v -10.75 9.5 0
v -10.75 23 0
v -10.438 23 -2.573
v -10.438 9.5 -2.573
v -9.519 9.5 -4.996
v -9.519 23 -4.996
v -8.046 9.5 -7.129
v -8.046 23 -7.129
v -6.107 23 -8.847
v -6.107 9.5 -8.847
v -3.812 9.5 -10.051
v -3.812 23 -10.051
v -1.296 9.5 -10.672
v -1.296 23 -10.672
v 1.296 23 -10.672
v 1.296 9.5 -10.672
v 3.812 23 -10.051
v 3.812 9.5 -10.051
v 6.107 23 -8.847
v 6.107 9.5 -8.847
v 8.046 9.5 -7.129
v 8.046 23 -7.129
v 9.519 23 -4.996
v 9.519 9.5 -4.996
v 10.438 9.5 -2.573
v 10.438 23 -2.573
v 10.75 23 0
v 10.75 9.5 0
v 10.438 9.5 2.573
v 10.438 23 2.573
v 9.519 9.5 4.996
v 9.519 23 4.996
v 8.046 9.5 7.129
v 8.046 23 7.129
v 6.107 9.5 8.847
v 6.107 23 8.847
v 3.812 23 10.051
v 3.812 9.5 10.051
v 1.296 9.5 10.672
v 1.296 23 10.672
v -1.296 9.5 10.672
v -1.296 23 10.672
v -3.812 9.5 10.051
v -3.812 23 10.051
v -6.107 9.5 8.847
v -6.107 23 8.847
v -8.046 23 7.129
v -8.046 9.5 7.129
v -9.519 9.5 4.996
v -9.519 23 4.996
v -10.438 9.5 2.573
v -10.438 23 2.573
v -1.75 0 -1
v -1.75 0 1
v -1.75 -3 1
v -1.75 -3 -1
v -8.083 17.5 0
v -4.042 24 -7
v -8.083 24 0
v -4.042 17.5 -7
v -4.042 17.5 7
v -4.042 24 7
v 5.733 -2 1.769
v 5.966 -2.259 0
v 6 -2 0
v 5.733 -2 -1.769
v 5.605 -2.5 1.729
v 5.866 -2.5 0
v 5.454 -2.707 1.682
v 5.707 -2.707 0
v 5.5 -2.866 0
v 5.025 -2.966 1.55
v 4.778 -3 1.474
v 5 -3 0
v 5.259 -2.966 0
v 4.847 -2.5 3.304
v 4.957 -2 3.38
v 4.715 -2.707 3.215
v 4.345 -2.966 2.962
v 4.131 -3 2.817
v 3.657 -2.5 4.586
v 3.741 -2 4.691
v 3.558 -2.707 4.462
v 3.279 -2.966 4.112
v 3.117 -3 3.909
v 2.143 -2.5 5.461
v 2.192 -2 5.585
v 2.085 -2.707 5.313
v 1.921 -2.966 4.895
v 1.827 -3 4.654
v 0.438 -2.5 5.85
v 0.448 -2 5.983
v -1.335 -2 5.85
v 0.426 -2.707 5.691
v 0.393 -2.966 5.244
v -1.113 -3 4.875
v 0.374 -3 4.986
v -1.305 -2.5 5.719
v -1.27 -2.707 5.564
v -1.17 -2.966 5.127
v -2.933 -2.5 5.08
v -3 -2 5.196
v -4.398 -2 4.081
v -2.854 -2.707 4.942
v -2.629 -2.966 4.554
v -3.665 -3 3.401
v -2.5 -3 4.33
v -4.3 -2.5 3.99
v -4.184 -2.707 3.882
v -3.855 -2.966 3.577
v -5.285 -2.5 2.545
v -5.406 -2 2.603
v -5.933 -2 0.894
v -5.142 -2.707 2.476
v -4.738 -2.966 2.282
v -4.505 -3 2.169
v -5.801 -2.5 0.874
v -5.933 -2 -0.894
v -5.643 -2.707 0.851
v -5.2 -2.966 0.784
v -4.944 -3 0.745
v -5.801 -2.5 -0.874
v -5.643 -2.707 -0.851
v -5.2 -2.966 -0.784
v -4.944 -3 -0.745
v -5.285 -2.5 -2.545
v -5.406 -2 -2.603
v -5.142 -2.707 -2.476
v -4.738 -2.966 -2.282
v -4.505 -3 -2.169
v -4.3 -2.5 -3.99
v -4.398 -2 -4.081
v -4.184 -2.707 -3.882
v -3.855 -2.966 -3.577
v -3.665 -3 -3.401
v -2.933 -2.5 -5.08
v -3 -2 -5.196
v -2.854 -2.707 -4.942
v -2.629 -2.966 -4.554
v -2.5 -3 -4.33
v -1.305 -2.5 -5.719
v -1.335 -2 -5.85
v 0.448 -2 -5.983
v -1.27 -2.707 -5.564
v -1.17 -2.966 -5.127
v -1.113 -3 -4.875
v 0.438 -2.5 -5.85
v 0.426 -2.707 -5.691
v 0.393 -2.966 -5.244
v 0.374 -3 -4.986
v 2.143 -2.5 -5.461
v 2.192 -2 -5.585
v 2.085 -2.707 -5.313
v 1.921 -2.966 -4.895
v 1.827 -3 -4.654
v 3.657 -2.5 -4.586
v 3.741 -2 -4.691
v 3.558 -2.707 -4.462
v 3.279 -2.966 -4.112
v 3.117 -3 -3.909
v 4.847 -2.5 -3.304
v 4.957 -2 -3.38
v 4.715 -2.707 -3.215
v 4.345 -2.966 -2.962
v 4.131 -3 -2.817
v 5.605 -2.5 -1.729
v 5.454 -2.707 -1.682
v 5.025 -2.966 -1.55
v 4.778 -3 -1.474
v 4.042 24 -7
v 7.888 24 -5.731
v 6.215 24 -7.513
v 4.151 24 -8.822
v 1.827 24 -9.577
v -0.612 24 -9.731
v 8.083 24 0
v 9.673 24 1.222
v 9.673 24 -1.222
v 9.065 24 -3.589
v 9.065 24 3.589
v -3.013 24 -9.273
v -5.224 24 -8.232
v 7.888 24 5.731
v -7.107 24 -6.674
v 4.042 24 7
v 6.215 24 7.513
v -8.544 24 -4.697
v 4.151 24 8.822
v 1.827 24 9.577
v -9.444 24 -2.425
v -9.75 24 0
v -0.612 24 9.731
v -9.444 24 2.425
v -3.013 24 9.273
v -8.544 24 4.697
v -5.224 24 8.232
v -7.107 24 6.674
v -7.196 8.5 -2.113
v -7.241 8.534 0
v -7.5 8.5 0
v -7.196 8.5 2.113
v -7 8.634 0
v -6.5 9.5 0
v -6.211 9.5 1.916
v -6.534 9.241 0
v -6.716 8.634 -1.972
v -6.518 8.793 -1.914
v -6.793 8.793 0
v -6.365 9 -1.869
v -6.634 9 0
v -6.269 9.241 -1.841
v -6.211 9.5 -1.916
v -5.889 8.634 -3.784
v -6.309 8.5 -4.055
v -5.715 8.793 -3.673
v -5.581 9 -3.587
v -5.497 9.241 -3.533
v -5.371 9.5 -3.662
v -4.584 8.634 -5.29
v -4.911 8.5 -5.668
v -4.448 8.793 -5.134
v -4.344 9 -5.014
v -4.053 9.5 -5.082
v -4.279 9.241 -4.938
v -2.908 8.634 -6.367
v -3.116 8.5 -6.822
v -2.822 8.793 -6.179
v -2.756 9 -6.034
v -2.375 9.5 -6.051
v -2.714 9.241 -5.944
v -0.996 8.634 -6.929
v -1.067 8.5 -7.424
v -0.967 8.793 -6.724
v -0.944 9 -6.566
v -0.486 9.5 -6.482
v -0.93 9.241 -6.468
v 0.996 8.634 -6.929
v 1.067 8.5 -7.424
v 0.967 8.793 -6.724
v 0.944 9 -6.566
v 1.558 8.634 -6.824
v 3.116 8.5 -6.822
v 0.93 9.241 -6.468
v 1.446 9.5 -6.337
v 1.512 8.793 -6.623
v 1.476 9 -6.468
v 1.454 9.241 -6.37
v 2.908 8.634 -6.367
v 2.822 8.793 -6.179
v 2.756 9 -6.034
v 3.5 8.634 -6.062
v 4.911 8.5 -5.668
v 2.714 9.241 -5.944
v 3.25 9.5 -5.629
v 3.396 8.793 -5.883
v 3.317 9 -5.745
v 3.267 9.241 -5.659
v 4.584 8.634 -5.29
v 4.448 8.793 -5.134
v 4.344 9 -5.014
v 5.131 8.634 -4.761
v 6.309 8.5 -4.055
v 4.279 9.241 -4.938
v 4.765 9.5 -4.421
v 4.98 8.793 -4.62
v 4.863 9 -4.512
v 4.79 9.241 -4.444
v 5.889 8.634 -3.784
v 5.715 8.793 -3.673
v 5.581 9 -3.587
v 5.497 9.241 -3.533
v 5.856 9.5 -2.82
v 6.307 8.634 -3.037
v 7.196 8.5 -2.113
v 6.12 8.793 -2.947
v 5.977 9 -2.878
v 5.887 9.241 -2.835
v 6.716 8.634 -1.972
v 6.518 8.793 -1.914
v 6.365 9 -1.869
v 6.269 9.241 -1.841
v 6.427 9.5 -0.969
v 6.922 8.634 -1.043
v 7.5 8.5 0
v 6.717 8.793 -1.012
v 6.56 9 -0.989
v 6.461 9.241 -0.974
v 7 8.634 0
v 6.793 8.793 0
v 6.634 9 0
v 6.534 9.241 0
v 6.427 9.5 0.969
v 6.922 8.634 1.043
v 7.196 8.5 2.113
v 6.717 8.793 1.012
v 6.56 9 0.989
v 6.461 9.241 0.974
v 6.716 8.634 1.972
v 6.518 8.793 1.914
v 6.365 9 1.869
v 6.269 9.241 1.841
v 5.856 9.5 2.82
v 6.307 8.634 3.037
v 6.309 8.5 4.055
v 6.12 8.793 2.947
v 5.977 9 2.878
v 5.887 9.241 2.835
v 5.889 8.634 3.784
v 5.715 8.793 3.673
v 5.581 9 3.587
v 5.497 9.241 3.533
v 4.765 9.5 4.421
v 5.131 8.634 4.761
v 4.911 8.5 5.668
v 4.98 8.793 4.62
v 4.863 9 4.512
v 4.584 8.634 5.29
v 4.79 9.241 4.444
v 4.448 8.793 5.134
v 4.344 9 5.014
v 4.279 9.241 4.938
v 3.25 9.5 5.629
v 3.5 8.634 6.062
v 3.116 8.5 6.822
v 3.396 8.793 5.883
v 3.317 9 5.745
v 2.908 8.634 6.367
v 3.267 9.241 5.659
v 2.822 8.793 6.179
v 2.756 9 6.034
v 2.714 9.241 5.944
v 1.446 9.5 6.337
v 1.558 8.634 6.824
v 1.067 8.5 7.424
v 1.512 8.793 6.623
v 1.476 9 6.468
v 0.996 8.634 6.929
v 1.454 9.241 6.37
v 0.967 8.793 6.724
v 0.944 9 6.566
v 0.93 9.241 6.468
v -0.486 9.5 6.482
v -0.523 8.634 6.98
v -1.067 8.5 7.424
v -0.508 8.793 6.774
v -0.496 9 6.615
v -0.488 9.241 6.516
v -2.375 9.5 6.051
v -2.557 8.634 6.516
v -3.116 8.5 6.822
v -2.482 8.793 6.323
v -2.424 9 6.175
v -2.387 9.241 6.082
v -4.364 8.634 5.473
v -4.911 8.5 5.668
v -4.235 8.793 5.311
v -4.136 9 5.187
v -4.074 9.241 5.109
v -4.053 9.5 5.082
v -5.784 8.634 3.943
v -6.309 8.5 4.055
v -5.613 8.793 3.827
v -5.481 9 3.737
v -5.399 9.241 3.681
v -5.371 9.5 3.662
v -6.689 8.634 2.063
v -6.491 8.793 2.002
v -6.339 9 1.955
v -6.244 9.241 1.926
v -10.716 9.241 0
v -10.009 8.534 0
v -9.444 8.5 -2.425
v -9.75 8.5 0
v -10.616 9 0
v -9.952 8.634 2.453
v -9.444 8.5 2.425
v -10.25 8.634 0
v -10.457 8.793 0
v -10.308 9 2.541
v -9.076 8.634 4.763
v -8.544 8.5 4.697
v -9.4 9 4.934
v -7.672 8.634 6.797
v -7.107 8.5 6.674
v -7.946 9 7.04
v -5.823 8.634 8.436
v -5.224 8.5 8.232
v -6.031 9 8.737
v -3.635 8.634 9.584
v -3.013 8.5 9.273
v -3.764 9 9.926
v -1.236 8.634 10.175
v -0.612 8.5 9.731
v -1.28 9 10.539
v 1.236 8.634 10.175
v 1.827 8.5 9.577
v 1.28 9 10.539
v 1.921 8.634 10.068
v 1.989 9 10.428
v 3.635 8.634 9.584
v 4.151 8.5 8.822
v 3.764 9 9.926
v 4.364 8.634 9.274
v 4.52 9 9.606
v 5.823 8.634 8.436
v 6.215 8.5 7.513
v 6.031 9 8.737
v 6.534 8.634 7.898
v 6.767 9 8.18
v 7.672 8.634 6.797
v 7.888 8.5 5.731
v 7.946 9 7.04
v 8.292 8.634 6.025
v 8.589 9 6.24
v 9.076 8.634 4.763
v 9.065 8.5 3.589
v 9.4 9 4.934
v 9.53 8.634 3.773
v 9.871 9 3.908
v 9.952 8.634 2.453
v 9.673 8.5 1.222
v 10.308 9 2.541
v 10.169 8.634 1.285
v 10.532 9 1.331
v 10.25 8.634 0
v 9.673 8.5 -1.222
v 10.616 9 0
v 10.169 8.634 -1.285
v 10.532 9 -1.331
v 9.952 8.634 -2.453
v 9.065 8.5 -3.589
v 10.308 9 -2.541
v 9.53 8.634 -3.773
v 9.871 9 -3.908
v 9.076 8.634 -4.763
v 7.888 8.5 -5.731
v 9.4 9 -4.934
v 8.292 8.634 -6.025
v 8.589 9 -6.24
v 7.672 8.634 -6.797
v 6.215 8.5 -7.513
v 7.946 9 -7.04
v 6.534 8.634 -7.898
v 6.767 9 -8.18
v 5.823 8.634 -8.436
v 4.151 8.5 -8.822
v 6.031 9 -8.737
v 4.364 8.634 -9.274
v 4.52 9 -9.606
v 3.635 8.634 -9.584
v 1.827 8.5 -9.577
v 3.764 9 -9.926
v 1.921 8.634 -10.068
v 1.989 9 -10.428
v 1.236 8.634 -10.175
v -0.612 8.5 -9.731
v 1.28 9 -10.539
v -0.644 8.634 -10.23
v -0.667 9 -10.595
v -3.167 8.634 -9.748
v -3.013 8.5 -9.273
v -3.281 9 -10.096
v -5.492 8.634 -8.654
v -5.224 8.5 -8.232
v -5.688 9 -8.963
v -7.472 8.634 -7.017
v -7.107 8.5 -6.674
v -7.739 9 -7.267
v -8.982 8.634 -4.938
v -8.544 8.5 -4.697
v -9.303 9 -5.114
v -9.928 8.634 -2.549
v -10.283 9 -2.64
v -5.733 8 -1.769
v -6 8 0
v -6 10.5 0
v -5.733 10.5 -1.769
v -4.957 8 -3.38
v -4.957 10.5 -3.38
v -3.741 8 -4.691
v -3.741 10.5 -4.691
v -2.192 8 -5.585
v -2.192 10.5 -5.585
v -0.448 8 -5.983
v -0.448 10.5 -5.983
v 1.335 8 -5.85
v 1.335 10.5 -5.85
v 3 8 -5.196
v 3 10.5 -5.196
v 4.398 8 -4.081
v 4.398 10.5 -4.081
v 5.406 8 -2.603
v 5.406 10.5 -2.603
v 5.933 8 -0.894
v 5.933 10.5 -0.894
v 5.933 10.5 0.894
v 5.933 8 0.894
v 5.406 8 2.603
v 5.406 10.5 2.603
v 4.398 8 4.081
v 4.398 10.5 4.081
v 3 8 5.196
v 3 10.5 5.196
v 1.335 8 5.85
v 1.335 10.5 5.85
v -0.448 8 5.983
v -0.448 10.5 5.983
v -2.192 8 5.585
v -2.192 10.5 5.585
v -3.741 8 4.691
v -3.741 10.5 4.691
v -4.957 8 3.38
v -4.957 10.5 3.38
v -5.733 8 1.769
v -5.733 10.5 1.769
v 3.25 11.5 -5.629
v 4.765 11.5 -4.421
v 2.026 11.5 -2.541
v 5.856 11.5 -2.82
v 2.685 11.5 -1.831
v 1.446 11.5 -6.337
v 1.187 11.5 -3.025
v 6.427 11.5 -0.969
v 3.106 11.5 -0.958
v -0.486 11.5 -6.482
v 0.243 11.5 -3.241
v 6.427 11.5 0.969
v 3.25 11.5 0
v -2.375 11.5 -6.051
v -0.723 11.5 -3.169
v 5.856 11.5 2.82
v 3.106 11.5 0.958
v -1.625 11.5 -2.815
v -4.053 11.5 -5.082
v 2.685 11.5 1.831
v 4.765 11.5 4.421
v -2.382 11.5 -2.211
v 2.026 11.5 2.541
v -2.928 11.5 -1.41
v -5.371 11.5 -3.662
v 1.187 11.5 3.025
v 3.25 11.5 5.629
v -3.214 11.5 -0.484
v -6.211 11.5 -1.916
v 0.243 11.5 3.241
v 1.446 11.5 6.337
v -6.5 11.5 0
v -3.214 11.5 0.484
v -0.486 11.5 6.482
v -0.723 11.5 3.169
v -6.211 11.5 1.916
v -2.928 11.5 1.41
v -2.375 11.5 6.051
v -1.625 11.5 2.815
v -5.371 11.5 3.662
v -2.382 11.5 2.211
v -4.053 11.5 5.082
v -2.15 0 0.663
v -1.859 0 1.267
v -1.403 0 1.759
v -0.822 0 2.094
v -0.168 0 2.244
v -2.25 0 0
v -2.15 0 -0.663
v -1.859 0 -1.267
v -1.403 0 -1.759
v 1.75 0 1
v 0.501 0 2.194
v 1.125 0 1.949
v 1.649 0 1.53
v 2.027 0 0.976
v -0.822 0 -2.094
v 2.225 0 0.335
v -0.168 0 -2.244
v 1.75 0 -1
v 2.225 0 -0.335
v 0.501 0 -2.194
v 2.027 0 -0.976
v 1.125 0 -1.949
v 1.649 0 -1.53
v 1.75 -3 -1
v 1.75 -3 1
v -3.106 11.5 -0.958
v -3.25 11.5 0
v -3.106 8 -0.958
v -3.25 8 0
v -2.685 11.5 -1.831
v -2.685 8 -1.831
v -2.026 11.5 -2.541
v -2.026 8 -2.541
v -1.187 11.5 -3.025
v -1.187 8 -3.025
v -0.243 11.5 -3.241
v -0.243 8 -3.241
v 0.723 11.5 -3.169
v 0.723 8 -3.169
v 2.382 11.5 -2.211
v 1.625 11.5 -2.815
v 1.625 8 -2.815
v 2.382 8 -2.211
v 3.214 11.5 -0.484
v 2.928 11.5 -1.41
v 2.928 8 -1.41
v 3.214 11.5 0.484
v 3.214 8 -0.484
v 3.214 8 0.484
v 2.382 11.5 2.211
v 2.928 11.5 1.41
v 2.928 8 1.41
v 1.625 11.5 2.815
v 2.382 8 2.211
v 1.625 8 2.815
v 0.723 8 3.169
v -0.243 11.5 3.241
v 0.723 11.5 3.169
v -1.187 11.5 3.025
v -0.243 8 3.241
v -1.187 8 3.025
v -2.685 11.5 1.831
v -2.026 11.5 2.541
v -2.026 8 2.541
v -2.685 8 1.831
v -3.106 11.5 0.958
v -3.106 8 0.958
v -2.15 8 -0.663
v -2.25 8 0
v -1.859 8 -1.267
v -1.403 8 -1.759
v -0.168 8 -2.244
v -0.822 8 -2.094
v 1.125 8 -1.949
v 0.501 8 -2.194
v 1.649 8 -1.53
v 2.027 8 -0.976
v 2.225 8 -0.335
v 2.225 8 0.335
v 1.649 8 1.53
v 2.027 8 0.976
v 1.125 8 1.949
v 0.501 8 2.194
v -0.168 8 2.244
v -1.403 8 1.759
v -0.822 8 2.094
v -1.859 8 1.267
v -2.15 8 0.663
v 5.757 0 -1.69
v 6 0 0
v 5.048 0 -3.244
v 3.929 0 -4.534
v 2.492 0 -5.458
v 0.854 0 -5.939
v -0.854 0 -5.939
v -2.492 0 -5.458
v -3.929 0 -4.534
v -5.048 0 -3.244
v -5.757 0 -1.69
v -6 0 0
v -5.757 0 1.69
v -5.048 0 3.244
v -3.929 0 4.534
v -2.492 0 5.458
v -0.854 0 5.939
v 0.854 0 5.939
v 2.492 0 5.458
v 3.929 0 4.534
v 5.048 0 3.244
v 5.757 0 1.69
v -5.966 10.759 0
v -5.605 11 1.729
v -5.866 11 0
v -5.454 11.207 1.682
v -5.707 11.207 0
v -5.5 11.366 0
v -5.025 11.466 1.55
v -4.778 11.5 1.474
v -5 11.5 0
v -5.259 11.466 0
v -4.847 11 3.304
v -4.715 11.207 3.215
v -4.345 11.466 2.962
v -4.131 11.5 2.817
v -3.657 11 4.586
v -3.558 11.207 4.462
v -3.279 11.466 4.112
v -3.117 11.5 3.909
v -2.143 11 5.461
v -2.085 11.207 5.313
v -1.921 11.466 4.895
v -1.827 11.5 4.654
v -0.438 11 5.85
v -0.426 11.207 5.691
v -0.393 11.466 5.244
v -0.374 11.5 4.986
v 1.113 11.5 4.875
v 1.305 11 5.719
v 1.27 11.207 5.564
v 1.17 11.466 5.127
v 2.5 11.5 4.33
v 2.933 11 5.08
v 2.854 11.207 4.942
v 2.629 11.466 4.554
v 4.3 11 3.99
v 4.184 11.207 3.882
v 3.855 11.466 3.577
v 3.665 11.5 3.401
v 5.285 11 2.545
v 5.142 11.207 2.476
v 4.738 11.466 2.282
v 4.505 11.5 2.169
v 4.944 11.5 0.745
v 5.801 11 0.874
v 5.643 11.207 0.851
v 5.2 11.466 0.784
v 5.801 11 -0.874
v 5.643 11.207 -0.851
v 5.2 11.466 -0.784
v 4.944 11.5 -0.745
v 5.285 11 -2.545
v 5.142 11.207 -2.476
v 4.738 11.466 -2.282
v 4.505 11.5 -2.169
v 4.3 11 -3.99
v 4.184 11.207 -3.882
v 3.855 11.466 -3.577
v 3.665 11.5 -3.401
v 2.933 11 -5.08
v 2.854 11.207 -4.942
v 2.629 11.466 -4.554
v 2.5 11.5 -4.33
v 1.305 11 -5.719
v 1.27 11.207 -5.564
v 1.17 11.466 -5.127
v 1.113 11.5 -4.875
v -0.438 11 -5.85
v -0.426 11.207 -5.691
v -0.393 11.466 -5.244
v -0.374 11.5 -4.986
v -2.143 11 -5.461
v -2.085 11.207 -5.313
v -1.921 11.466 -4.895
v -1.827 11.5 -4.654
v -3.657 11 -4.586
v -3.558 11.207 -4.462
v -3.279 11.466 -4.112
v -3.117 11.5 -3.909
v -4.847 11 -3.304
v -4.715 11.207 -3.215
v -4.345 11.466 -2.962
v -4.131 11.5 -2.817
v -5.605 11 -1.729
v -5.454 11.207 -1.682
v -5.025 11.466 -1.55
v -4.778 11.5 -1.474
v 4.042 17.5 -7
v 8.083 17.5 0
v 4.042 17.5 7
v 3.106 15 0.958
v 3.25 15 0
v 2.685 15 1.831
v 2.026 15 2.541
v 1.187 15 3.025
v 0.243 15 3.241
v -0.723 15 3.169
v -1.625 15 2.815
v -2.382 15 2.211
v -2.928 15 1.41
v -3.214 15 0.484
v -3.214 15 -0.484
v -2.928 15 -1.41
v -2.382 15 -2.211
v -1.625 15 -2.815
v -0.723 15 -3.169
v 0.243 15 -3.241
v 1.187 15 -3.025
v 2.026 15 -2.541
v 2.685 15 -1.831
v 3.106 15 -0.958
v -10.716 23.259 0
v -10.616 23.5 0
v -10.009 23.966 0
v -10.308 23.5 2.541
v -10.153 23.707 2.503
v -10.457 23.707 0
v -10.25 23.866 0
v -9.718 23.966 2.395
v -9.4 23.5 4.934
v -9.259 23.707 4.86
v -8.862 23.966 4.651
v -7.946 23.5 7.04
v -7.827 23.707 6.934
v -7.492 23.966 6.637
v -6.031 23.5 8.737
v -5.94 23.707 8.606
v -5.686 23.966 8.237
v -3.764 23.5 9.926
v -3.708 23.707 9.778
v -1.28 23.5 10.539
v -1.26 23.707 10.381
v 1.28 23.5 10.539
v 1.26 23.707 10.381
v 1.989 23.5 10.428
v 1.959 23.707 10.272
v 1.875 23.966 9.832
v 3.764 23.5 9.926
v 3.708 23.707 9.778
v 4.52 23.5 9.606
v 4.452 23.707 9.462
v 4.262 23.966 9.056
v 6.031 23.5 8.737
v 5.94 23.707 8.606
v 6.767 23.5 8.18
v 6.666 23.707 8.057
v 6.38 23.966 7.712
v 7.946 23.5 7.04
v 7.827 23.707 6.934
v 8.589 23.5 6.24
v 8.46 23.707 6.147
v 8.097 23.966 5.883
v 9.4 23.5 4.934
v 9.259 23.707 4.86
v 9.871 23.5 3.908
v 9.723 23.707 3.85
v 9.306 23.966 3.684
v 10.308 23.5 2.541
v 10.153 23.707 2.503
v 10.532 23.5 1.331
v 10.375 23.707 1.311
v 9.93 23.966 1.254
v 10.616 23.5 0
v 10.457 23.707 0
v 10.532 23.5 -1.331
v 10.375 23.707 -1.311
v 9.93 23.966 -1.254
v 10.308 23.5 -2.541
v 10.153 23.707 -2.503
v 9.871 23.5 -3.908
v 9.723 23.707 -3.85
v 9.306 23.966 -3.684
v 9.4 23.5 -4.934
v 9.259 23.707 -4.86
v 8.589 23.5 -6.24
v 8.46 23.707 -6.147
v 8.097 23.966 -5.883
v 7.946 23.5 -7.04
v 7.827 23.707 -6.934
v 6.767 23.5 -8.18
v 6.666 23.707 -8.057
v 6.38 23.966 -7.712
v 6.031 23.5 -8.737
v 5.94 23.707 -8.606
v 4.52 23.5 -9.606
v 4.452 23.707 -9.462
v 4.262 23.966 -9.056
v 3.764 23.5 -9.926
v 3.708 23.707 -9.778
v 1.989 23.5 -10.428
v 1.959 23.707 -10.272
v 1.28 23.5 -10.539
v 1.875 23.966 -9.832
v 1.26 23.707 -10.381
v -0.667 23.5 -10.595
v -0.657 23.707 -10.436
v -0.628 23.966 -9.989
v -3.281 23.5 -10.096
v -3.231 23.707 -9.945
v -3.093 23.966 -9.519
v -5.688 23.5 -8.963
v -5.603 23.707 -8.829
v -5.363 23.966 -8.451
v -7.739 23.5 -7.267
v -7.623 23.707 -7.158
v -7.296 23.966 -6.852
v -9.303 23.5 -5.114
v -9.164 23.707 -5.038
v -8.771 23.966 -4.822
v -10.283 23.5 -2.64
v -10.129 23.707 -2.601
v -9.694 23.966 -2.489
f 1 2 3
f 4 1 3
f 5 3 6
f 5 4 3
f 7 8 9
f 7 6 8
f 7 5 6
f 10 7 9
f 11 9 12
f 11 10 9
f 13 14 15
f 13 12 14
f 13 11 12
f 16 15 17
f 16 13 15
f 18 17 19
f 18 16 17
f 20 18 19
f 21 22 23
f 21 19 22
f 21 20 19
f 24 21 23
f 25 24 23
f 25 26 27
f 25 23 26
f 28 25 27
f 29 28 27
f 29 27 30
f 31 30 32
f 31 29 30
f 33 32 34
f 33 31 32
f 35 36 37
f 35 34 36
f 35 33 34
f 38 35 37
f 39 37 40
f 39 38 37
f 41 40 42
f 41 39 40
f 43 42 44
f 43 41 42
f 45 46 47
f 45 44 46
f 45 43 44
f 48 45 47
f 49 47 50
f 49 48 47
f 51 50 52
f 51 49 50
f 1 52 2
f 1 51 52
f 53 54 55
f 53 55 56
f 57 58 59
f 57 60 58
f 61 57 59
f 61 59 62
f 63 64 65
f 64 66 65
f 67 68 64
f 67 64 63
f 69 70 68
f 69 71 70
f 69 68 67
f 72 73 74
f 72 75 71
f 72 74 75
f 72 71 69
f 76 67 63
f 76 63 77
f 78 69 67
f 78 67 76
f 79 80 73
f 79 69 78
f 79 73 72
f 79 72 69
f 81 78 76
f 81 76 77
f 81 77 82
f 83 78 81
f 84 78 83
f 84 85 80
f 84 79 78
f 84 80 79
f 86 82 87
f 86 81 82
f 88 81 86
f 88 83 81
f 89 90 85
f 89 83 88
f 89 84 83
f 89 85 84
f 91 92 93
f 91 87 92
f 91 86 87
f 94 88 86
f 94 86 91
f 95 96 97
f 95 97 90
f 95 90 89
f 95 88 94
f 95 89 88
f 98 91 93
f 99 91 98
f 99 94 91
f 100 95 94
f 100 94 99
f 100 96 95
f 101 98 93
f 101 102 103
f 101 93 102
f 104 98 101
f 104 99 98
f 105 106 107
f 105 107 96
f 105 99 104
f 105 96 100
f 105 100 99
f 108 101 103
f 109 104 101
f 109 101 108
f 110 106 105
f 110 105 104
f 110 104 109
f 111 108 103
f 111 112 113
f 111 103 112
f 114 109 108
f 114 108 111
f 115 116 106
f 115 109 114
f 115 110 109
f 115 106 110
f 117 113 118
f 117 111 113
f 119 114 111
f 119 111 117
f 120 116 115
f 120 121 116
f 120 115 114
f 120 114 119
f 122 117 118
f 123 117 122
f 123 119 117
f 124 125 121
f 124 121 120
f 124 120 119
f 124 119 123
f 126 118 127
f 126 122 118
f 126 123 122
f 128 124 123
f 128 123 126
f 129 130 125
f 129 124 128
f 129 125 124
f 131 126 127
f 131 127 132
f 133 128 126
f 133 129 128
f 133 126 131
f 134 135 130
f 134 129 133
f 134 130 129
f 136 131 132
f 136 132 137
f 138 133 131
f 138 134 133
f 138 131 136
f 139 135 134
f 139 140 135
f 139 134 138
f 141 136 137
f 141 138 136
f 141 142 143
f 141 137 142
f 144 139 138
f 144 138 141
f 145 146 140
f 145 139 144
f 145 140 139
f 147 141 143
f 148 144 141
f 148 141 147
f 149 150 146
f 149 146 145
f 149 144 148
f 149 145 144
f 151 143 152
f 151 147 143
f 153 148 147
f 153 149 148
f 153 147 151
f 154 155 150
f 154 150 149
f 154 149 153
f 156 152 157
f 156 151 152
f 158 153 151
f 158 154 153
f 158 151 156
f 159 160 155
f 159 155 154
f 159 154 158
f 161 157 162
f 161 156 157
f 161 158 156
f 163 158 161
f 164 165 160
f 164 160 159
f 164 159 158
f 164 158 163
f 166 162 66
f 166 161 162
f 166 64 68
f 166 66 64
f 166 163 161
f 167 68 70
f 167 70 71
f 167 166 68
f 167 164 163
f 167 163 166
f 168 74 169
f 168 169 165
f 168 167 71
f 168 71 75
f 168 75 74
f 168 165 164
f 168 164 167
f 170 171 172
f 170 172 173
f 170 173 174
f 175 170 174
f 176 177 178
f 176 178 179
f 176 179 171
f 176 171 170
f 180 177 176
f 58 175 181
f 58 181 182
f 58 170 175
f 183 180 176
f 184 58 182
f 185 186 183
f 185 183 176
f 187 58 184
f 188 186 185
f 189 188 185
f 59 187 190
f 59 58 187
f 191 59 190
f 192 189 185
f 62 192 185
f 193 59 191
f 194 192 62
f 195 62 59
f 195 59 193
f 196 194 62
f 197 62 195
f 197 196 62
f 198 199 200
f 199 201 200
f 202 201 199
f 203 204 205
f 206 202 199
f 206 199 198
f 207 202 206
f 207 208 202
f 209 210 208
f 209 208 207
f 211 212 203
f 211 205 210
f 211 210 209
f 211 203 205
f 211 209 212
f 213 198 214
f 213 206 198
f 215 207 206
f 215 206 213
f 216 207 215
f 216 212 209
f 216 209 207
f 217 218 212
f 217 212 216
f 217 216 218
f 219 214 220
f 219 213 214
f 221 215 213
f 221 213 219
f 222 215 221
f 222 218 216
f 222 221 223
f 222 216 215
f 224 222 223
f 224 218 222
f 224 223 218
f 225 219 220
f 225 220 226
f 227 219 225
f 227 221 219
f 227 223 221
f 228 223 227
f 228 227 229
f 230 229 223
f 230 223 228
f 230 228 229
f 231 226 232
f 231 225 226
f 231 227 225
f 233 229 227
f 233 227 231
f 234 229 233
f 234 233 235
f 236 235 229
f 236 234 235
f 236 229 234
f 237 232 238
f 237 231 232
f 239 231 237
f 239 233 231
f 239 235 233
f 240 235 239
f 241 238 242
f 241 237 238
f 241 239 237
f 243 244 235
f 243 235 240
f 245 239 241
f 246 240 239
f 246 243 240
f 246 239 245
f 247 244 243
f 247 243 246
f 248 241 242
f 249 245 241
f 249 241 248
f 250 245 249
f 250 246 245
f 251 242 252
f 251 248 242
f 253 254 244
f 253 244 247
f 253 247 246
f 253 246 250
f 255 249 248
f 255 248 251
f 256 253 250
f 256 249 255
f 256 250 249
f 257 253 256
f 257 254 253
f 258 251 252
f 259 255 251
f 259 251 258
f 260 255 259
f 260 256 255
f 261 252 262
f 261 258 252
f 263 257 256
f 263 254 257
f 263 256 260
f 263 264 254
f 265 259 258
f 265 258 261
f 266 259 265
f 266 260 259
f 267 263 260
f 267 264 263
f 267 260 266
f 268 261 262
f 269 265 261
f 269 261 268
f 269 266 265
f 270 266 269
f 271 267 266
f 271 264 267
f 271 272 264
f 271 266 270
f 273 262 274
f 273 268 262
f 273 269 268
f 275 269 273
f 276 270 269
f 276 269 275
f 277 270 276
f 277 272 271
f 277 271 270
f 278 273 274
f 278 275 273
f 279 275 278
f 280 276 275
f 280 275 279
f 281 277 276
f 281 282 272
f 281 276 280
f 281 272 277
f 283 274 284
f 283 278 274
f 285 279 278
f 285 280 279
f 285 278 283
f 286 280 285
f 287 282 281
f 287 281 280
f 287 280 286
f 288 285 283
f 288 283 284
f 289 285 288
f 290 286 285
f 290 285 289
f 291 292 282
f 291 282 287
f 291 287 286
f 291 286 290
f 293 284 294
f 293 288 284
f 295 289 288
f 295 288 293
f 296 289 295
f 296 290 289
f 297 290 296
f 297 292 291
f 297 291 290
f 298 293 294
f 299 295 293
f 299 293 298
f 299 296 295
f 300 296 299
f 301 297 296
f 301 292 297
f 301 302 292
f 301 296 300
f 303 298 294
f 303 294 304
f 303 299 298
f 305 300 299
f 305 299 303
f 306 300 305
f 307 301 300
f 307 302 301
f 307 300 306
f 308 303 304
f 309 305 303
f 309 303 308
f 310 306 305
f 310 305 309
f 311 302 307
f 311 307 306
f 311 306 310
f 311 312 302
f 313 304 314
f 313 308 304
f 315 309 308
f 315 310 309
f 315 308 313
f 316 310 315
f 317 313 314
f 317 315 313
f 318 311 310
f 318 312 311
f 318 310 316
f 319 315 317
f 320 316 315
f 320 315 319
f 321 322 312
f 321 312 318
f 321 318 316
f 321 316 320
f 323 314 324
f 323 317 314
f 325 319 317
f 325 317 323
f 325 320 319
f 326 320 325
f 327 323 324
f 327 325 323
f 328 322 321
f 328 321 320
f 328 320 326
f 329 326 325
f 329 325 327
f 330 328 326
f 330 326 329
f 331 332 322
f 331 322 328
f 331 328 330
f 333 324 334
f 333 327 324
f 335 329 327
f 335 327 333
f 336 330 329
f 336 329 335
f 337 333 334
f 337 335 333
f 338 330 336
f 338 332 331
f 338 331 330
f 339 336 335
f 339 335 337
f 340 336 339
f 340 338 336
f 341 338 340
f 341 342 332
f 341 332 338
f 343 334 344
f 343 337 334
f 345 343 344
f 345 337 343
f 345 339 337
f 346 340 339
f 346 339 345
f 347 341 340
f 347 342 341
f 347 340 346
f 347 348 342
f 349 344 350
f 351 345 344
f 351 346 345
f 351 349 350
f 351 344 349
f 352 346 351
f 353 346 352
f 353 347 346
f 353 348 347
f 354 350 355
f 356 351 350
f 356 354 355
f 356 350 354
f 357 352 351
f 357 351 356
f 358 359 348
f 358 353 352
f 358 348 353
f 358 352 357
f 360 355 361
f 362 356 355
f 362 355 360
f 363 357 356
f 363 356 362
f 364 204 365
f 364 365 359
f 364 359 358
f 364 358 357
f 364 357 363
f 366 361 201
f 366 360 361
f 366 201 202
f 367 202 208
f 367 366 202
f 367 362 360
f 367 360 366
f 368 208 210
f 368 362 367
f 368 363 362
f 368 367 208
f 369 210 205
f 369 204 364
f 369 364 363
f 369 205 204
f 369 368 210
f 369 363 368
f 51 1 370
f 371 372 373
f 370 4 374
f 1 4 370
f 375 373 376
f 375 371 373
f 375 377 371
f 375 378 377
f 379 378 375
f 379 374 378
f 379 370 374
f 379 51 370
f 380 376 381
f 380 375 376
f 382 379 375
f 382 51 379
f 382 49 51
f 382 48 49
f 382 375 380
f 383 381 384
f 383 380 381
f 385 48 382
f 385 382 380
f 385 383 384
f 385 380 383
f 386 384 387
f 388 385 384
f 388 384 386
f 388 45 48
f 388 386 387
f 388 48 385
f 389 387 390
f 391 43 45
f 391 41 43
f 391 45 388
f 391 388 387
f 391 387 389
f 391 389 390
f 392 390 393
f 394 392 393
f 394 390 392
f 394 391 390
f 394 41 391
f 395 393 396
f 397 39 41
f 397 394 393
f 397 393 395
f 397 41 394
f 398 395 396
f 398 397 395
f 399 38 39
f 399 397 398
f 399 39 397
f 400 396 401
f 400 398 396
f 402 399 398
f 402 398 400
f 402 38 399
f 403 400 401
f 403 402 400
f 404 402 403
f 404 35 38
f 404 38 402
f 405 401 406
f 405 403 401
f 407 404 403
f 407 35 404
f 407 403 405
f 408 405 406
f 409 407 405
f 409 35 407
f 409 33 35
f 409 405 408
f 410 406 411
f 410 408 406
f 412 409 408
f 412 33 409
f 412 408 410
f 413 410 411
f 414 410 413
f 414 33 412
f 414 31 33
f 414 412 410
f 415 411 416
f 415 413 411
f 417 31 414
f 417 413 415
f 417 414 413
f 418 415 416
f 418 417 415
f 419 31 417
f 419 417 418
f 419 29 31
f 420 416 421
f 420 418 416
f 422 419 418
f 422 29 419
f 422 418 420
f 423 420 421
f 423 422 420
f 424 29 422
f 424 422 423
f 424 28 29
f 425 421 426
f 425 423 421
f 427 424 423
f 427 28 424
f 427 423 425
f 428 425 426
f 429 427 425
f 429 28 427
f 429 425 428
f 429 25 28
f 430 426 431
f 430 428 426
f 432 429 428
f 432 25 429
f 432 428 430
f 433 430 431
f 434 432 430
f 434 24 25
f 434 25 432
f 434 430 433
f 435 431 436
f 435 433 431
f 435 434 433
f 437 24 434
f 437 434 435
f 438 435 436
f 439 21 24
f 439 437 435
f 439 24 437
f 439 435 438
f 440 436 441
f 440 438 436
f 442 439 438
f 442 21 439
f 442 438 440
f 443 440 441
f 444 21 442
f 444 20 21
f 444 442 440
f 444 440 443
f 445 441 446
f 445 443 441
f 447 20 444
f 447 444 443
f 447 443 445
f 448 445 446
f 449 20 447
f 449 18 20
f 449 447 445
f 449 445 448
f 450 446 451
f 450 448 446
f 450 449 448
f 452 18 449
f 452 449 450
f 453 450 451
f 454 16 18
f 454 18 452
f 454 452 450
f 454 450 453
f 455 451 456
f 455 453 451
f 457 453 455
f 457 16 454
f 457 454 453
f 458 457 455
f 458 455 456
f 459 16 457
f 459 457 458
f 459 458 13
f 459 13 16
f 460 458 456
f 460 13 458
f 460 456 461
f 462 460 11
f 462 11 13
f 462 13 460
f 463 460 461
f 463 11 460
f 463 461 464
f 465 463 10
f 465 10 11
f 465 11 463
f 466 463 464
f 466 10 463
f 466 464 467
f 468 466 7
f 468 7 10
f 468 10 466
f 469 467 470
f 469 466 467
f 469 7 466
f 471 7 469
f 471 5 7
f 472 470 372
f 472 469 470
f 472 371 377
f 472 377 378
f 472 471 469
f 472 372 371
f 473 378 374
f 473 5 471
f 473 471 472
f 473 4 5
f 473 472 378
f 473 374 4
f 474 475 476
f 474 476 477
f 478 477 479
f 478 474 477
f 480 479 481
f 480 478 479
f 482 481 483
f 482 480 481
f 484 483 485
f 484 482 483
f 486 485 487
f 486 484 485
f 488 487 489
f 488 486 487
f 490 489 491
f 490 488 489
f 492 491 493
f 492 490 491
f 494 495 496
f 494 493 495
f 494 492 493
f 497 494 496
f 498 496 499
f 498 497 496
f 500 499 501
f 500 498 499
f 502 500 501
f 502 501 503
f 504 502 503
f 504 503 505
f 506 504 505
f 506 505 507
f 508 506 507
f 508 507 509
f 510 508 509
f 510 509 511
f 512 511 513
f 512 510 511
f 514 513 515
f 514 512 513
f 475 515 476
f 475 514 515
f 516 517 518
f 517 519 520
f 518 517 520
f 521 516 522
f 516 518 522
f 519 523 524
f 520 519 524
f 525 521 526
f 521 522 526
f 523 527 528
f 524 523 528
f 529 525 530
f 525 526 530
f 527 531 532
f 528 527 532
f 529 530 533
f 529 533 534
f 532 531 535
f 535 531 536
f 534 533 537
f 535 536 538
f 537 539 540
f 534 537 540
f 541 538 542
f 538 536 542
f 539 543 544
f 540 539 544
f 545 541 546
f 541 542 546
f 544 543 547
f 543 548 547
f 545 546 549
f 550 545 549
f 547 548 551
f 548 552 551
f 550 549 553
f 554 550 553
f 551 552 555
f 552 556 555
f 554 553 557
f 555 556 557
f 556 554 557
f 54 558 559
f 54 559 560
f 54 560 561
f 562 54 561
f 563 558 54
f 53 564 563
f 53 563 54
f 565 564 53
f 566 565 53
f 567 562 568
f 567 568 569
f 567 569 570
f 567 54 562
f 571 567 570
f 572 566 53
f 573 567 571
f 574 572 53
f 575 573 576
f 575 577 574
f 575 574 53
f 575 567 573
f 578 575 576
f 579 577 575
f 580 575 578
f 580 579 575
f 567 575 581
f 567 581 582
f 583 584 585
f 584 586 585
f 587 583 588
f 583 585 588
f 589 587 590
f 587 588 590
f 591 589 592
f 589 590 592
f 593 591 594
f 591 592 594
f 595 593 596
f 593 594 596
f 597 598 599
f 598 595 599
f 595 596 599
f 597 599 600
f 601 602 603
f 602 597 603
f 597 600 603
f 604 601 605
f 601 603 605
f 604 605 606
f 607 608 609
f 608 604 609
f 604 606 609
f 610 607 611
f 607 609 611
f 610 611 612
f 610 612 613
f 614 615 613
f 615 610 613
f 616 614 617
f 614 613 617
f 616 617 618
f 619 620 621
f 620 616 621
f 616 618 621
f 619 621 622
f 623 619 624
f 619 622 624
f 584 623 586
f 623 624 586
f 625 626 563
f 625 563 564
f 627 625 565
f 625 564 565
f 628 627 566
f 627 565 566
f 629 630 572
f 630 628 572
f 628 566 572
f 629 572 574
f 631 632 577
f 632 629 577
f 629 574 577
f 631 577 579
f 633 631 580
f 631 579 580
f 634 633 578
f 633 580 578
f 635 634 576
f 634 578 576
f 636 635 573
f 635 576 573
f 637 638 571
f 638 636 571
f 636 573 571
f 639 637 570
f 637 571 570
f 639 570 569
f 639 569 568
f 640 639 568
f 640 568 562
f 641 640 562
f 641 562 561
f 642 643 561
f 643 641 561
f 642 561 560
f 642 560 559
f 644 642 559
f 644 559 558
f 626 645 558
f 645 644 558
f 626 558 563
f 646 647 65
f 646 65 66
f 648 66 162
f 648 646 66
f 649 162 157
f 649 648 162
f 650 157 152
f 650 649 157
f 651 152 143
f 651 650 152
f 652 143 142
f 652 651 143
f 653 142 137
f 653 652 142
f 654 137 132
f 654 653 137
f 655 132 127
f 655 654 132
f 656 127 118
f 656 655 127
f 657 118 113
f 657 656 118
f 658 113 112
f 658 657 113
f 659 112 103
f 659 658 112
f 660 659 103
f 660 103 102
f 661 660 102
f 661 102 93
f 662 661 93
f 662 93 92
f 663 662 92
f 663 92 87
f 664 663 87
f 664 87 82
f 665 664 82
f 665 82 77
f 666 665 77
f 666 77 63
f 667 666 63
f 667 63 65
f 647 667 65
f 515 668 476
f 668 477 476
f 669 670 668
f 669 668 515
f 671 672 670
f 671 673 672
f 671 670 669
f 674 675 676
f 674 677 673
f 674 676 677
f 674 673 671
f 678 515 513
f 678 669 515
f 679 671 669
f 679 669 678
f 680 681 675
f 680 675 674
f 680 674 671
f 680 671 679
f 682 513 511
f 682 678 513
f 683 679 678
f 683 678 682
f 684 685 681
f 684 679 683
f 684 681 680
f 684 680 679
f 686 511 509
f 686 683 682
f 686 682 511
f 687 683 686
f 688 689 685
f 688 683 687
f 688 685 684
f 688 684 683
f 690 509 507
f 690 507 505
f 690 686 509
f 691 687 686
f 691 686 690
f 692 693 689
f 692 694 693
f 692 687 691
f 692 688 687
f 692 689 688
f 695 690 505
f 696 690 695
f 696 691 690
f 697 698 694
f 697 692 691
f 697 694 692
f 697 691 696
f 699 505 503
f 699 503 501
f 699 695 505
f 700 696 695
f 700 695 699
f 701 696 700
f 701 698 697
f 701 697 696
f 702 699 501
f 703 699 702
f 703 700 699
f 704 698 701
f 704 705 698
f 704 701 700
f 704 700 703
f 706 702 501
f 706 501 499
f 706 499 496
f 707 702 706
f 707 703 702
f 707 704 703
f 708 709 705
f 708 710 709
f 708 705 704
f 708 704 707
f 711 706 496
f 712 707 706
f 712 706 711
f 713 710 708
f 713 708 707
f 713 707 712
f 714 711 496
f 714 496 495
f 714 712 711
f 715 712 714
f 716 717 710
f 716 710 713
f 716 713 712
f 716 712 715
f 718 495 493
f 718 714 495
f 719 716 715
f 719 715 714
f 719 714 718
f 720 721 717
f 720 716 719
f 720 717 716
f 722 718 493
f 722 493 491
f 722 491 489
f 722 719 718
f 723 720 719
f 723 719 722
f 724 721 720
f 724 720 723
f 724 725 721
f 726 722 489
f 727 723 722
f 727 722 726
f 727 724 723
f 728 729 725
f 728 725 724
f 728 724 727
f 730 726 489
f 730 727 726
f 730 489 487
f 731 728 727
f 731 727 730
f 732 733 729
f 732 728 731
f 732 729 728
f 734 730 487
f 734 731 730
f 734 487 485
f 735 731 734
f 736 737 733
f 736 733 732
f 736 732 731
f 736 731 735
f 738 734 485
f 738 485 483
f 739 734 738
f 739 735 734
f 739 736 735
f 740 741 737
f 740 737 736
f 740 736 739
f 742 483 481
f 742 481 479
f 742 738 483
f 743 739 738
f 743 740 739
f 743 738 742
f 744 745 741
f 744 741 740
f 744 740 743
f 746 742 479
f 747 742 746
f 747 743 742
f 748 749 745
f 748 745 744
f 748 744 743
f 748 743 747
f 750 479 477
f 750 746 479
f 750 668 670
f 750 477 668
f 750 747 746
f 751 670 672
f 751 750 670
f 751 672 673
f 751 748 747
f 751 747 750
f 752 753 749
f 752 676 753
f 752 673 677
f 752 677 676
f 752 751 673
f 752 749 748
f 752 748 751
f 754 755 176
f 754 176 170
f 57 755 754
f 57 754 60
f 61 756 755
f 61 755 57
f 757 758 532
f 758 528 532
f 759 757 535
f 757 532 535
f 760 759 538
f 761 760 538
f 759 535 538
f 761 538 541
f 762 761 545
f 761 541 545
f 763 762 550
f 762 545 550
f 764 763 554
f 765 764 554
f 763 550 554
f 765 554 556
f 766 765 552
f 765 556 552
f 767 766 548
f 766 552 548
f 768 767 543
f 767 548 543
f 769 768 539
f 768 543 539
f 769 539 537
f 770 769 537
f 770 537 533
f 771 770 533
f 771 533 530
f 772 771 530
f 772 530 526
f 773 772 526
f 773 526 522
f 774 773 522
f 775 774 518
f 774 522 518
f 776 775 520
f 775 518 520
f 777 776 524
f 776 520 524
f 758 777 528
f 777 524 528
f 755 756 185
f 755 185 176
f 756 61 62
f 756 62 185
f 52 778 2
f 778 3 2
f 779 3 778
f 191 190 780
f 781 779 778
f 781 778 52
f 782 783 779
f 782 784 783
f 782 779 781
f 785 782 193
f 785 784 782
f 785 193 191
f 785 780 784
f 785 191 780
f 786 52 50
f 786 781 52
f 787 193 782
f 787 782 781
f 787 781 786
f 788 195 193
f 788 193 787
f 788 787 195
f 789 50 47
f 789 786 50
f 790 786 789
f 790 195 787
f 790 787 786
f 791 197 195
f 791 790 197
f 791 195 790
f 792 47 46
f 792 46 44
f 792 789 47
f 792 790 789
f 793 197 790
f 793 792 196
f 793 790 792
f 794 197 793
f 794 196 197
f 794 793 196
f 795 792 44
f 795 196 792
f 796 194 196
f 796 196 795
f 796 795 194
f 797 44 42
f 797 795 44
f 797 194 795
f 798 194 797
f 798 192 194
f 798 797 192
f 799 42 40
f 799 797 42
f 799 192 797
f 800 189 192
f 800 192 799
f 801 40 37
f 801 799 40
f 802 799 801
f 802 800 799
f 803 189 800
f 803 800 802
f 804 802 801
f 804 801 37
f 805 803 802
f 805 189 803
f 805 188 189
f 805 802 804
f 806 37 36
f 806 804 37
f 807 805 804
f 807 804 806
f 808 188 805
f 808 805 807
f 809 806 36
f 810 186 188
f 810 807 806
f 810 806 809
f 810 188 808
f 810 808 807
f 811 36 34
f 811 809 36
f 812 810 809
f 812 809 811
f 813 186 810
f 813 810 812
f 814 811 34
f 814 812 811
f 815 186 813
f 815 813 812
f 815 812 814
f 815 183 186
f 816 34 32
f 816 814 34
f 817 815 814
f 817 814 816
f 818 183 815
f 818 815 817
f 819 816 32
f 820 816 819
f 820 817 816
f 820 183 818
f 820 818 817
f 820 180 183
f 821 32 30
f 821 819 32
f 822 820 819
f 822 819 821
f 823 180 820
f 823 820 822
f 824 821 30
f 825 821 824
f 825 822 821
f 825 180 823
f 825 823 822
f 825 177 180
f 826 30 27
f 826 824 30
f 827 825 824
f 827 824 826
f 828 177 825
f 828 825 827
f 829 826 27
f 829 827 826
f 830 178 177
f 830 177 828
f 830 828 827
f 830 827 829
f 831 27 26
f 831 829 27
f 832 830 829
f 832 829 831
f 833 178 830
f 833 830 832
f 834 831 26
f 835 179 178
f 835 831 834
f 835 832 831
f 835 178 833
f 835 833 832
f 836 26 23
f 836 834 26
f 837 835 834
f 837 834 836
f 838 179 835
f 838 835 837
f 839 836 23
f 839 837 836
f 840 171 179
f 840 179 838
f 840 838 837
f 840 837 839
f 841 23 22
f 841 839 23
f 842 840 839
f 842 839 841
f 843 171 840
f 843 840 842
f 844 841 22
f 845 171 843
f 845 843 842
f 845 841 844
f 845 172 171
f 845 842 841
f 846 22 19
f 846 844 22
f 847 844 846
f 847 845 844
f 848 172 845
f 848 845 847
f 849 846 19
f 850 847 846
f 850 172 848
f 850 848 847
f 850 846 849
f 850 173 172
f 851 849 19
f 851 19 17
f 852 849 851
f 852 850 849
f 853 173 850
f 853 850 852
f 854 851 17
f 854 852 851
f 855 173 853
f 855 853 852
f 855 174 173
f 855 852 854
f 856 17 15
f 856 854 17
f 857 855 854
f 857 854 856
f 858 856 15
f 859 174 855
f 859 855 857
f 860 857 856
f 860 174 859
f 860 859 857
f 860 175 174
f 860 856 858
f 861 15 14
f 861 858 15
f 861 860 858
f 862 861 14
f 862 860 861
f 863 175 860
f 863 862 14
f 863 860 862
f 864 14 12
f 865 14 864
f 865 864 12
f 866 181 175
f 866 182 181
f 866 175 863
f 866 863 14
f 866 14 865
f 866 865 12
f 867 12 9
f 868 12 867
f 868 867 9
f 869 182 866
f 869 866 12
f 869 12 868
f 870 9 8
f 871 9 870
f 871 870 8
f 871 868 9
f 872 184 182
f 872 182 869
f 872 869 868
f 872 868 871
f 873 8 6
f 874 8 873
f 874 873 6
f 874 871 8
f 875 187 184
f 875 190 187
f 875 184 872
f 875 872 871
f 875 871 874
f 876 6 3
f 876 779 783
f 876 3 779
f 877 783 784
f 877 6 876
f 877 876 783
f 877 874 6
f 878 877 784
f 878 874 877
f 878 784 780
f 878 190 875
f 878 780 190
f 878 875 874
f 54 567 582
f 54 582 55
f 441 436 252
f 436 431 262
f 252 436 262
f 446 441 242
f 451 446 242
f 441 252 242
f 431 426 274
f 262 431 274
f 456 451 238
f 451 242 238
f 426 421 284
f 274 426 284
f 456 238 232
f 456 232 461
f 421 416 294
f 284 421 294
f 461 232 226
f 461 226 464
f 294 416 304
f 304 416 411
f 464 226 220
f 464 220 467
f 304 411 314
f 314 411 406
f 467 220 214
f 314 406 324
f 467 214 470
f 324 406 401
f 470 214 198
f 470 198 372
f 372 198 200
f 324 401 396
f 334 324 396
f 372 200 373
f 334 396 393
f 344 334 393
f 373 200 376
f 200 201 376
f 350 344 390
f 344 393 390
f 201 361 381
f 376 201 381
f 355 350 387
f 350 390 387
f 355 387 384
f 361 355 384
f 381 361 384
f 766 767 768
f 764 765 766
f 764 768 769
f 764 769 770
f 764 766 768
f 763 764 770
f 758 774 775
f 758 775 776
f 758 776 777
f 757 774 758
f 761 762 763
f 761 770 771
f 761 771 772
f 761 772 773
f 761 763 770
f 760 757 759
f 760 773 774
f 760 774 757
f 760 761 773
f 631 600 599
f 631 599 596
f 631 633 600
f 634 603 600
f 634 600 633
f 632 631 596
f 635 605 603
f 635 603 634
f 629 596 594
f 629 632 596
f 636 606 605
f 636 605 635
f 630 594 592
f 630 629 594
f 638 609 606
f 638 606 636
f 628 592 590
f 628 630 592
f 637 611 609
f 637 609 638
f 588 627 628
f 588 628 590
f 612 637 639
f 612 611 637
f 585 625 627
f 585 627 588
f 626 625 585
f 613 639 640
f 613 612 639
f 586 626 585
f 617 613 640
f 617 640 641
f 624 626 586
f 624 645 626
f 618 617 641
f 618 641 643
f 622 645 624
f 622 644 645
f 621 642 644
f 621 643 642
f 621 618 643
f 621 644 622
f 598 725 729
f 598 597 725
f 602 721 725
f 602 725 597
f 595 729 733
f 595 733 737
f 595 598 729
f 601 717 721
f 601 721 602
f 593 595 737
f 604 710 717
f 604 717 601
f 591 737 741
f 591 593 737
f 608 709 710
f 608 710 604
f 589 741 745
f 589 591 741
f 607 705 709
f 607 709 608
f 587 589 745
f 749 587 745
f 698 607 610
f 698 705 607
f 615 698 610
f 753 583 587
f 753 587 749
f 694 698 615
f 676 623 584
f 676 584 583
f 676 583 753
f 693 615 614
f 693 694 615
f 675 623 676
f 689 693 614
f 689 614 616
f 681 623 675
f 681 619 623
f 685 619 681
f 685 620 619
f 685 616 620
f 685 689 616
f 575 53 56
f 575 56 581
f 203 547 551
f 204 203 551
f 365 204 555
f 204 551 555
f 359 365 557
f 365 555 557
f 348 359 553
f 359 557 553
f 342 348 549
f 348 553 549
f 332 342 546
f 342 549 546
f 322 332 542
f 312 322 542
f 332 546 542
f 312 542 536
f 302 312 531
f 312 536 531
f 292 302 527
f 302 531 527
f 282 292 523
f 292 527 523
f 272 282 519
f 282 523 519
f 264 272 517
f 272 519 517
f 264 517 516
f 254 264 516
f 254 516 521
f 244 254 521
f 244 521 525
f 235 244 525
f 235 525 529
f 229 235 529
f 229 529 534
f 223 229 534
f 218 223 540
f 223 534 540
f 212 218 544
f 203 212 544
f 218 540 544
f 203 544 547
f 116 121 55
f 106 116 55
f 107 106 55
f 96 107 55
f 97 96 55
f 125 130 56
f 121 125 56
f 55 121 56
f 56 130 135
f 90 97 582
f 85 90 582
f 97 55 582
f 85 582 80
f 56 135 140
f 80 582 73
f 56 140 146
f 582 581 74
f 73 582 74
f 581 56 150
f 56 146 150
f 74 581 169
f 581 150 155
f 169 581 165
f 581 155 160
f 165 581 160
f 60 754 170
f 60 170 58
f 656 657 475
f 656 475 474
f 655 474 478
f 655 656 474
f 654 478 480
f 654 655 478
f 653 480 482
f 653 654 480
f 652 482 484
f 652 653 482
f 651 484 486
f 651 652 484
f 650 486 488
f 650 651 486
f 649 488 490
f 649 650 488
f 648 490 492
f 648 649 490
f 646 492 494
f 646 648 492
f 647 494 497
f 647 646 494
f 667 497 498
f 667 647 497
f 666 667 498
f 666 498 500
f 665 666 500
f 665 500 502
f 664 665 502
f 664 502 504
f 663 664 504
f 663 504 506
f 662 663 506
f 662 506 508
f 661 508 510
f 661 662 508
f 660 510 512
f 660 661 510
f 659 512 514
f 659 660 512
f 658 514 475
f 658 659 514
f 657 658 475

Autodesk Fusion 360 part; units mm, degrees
sketch "Sketch1" plane through (0, 0, 0) normal (0, 1, 0) x (1, 0, 0) in component "Forcep"
  circle A0 centre (0, 0) radius 6
  dimension "d1" = 12
extrude "Extrude1" add sketch "Sketch1" against normal blind 3 makes body 1 in component "Forcep"
sketch "Sketch2" plane through (0, 0, 0) normal (0, 1, 0) x (-1, 0, 0) in component "Forcep"
  circle A0 centre (0, 0) radius 6
  line L0 (1.75, -1) -> (-1.75, -1)
  line L1 (-1.75, -1) -> (-1.75, 1)
  line L2 (-1.75, 1) -> (1.75, 1)
  line L3 (1.75, 1) -> (1.75, -1)
  line L4 (1.75, -1) -> (-1.75, 1) construction
  line L5 (-1.75, -1) -> (1.75, 1) construction
  dimension "d4" = 3.5
  dimension "d5" = 2
extrude "Extrude2" cut sketch "Sketch2" against normal up to surface (3 mm away) contours L0 L1 L2 L3 bodies 1 in component "Forcep"
sketch "Sketch3" plane through (0, 0, 0) normal (0, 1, 0) x (-1, 0, 0) in component "Forcep"
  line L0 (1.75, 1) -> (1.75, -1)
  line L1 (1.75, -1) -> (-1.75, -1)
  line L2 (-1.75, -1) -> (-1.75, 1)
  line L3 (-1.75, 1) -> (1.75, 1)
  circle A0 centre (0, 0) radius 6
  circle A1 centre (0, 0) radius 2.25
  dimension "d8" = 4.5
extrude "Extrude3" add sketch "Sketch3" along normal blind 8 contours A0 bodies 1 in component "Forcep"
sketch "Sketch4" plane through (0, 8, 0) normal (0, 1, 0) x (-1, 0, 0) in component "Forcep"
  circle A0 centre (0, 0) radius 2.25
  circle A1 centre (0, 0) radius 6
  circle A2 centre (0, 0) radius 3.25
  dimension "d11" = 6.5
extrude "Extrude4" add sketch "Sketch4" along normal blind 3.5 contours A1 bodies 1 in component "Forcep"
sketch "Sketch4 (2)" plane through (0, 11.5, 0) normal (0, 1, 0) x (-1, 0, 0) in component "Plunger"
  circle A0 centre (0, 0) radius 3.25
  circle A1 centre (0, 0) radius 6.5
  circle A2 centre (0, 0) radius 10.75
  dimension "d20" = 13
  dimension "d21" = 21.5
extrude "Extrude3'" add sketch "Sketch4 (2)" against normal blind 3 separate body contours A2 makes body 2 in component "Plunger"
sketch "Sketch5" plane through (0, 11.5, 0) normal (0, 1, 0) x (-1, 0, 0) in component "Plunger"
  circle A0 centre (0, 0) radius 6.5
  circle A1 centre (0, 0) radius 10.75
  circle A2 centre (0, 0) radius 9.15
extrude "Extrude4'" add sketch "Sketch5" along normal blind 6 contours A0 | A1 | A2 bodies 2 in component "Plunger"
sketch "Sketch1 (2)" plane through (0, 11.5, 0) normal (0, -1, 0) x (1, 0, 0)
  circle A0 centre (0, 0) radius 6.5
  circle A1 centre (0, 0) radius 3.25
  dimension "d29" = 6.5
extrude "Extrude6" cut sketch "Sketch1 (2)" against normal blind 3.5 contours A1 bodies 2 in component "Plunger"
sketch "Sketch7" plane through (0, 17.5, 0) normal (0, 1, 0) x (-1, 0, 0) in component "Plunger"
  circle A0 centre (0, 0) radius 10.75
  line L0 (4.0415, -7) -> (8.0829, 0)
  line L1 (8.0829, 0) -> (4.0415, 7)
  line L2 (4.0415, 7) -> (-4.0415, 7)
  line L3 (-4.0415, 7) -> (-8.0829, 0)
  line L4 (-8.0829, 0) -> (-4.0415, -7)
  line L5 (-4.0415, -7) -> (4.0415, -7)
  dimension "d32" = 7
extrude "Extrude7" add sketch "Sketch7" along normal blind 6.5 bodies 2 in component "Plunger"
fillet "Fillet1" radius 1 1 edges at (6.0601, 8.5, -2.3505) on bodies 2 in component "Plunger"
fillet "Fillet2" radius 1 1 edges at (10.0225, 8.5, 3.8874) on bodies 2 in component "Plunger"
fillet "Fillet3" radius 1 1 edges at (10.0225, 24, -3.8874) on bodies 2 in component "Plunger"
fillet "Fillet1'" radius 1 1 edges at (-5.594, -3, -2.1697) on bodies 1 in component "Forcep"
fillet "Fillet2'" radius 1 1 edges at (5.594, 11.5, -2.1697) on bodies 1 in component "Forcep"
component "Plunger" placed x (1, 0, 0) y (0, 1, 0) z (0, 0, 1) at (0, 0, 0)
component "Forcep" placed x (1, 0, 0) y (0, 1, 0) z (0, 0, 1) at (0, 0, 0)
